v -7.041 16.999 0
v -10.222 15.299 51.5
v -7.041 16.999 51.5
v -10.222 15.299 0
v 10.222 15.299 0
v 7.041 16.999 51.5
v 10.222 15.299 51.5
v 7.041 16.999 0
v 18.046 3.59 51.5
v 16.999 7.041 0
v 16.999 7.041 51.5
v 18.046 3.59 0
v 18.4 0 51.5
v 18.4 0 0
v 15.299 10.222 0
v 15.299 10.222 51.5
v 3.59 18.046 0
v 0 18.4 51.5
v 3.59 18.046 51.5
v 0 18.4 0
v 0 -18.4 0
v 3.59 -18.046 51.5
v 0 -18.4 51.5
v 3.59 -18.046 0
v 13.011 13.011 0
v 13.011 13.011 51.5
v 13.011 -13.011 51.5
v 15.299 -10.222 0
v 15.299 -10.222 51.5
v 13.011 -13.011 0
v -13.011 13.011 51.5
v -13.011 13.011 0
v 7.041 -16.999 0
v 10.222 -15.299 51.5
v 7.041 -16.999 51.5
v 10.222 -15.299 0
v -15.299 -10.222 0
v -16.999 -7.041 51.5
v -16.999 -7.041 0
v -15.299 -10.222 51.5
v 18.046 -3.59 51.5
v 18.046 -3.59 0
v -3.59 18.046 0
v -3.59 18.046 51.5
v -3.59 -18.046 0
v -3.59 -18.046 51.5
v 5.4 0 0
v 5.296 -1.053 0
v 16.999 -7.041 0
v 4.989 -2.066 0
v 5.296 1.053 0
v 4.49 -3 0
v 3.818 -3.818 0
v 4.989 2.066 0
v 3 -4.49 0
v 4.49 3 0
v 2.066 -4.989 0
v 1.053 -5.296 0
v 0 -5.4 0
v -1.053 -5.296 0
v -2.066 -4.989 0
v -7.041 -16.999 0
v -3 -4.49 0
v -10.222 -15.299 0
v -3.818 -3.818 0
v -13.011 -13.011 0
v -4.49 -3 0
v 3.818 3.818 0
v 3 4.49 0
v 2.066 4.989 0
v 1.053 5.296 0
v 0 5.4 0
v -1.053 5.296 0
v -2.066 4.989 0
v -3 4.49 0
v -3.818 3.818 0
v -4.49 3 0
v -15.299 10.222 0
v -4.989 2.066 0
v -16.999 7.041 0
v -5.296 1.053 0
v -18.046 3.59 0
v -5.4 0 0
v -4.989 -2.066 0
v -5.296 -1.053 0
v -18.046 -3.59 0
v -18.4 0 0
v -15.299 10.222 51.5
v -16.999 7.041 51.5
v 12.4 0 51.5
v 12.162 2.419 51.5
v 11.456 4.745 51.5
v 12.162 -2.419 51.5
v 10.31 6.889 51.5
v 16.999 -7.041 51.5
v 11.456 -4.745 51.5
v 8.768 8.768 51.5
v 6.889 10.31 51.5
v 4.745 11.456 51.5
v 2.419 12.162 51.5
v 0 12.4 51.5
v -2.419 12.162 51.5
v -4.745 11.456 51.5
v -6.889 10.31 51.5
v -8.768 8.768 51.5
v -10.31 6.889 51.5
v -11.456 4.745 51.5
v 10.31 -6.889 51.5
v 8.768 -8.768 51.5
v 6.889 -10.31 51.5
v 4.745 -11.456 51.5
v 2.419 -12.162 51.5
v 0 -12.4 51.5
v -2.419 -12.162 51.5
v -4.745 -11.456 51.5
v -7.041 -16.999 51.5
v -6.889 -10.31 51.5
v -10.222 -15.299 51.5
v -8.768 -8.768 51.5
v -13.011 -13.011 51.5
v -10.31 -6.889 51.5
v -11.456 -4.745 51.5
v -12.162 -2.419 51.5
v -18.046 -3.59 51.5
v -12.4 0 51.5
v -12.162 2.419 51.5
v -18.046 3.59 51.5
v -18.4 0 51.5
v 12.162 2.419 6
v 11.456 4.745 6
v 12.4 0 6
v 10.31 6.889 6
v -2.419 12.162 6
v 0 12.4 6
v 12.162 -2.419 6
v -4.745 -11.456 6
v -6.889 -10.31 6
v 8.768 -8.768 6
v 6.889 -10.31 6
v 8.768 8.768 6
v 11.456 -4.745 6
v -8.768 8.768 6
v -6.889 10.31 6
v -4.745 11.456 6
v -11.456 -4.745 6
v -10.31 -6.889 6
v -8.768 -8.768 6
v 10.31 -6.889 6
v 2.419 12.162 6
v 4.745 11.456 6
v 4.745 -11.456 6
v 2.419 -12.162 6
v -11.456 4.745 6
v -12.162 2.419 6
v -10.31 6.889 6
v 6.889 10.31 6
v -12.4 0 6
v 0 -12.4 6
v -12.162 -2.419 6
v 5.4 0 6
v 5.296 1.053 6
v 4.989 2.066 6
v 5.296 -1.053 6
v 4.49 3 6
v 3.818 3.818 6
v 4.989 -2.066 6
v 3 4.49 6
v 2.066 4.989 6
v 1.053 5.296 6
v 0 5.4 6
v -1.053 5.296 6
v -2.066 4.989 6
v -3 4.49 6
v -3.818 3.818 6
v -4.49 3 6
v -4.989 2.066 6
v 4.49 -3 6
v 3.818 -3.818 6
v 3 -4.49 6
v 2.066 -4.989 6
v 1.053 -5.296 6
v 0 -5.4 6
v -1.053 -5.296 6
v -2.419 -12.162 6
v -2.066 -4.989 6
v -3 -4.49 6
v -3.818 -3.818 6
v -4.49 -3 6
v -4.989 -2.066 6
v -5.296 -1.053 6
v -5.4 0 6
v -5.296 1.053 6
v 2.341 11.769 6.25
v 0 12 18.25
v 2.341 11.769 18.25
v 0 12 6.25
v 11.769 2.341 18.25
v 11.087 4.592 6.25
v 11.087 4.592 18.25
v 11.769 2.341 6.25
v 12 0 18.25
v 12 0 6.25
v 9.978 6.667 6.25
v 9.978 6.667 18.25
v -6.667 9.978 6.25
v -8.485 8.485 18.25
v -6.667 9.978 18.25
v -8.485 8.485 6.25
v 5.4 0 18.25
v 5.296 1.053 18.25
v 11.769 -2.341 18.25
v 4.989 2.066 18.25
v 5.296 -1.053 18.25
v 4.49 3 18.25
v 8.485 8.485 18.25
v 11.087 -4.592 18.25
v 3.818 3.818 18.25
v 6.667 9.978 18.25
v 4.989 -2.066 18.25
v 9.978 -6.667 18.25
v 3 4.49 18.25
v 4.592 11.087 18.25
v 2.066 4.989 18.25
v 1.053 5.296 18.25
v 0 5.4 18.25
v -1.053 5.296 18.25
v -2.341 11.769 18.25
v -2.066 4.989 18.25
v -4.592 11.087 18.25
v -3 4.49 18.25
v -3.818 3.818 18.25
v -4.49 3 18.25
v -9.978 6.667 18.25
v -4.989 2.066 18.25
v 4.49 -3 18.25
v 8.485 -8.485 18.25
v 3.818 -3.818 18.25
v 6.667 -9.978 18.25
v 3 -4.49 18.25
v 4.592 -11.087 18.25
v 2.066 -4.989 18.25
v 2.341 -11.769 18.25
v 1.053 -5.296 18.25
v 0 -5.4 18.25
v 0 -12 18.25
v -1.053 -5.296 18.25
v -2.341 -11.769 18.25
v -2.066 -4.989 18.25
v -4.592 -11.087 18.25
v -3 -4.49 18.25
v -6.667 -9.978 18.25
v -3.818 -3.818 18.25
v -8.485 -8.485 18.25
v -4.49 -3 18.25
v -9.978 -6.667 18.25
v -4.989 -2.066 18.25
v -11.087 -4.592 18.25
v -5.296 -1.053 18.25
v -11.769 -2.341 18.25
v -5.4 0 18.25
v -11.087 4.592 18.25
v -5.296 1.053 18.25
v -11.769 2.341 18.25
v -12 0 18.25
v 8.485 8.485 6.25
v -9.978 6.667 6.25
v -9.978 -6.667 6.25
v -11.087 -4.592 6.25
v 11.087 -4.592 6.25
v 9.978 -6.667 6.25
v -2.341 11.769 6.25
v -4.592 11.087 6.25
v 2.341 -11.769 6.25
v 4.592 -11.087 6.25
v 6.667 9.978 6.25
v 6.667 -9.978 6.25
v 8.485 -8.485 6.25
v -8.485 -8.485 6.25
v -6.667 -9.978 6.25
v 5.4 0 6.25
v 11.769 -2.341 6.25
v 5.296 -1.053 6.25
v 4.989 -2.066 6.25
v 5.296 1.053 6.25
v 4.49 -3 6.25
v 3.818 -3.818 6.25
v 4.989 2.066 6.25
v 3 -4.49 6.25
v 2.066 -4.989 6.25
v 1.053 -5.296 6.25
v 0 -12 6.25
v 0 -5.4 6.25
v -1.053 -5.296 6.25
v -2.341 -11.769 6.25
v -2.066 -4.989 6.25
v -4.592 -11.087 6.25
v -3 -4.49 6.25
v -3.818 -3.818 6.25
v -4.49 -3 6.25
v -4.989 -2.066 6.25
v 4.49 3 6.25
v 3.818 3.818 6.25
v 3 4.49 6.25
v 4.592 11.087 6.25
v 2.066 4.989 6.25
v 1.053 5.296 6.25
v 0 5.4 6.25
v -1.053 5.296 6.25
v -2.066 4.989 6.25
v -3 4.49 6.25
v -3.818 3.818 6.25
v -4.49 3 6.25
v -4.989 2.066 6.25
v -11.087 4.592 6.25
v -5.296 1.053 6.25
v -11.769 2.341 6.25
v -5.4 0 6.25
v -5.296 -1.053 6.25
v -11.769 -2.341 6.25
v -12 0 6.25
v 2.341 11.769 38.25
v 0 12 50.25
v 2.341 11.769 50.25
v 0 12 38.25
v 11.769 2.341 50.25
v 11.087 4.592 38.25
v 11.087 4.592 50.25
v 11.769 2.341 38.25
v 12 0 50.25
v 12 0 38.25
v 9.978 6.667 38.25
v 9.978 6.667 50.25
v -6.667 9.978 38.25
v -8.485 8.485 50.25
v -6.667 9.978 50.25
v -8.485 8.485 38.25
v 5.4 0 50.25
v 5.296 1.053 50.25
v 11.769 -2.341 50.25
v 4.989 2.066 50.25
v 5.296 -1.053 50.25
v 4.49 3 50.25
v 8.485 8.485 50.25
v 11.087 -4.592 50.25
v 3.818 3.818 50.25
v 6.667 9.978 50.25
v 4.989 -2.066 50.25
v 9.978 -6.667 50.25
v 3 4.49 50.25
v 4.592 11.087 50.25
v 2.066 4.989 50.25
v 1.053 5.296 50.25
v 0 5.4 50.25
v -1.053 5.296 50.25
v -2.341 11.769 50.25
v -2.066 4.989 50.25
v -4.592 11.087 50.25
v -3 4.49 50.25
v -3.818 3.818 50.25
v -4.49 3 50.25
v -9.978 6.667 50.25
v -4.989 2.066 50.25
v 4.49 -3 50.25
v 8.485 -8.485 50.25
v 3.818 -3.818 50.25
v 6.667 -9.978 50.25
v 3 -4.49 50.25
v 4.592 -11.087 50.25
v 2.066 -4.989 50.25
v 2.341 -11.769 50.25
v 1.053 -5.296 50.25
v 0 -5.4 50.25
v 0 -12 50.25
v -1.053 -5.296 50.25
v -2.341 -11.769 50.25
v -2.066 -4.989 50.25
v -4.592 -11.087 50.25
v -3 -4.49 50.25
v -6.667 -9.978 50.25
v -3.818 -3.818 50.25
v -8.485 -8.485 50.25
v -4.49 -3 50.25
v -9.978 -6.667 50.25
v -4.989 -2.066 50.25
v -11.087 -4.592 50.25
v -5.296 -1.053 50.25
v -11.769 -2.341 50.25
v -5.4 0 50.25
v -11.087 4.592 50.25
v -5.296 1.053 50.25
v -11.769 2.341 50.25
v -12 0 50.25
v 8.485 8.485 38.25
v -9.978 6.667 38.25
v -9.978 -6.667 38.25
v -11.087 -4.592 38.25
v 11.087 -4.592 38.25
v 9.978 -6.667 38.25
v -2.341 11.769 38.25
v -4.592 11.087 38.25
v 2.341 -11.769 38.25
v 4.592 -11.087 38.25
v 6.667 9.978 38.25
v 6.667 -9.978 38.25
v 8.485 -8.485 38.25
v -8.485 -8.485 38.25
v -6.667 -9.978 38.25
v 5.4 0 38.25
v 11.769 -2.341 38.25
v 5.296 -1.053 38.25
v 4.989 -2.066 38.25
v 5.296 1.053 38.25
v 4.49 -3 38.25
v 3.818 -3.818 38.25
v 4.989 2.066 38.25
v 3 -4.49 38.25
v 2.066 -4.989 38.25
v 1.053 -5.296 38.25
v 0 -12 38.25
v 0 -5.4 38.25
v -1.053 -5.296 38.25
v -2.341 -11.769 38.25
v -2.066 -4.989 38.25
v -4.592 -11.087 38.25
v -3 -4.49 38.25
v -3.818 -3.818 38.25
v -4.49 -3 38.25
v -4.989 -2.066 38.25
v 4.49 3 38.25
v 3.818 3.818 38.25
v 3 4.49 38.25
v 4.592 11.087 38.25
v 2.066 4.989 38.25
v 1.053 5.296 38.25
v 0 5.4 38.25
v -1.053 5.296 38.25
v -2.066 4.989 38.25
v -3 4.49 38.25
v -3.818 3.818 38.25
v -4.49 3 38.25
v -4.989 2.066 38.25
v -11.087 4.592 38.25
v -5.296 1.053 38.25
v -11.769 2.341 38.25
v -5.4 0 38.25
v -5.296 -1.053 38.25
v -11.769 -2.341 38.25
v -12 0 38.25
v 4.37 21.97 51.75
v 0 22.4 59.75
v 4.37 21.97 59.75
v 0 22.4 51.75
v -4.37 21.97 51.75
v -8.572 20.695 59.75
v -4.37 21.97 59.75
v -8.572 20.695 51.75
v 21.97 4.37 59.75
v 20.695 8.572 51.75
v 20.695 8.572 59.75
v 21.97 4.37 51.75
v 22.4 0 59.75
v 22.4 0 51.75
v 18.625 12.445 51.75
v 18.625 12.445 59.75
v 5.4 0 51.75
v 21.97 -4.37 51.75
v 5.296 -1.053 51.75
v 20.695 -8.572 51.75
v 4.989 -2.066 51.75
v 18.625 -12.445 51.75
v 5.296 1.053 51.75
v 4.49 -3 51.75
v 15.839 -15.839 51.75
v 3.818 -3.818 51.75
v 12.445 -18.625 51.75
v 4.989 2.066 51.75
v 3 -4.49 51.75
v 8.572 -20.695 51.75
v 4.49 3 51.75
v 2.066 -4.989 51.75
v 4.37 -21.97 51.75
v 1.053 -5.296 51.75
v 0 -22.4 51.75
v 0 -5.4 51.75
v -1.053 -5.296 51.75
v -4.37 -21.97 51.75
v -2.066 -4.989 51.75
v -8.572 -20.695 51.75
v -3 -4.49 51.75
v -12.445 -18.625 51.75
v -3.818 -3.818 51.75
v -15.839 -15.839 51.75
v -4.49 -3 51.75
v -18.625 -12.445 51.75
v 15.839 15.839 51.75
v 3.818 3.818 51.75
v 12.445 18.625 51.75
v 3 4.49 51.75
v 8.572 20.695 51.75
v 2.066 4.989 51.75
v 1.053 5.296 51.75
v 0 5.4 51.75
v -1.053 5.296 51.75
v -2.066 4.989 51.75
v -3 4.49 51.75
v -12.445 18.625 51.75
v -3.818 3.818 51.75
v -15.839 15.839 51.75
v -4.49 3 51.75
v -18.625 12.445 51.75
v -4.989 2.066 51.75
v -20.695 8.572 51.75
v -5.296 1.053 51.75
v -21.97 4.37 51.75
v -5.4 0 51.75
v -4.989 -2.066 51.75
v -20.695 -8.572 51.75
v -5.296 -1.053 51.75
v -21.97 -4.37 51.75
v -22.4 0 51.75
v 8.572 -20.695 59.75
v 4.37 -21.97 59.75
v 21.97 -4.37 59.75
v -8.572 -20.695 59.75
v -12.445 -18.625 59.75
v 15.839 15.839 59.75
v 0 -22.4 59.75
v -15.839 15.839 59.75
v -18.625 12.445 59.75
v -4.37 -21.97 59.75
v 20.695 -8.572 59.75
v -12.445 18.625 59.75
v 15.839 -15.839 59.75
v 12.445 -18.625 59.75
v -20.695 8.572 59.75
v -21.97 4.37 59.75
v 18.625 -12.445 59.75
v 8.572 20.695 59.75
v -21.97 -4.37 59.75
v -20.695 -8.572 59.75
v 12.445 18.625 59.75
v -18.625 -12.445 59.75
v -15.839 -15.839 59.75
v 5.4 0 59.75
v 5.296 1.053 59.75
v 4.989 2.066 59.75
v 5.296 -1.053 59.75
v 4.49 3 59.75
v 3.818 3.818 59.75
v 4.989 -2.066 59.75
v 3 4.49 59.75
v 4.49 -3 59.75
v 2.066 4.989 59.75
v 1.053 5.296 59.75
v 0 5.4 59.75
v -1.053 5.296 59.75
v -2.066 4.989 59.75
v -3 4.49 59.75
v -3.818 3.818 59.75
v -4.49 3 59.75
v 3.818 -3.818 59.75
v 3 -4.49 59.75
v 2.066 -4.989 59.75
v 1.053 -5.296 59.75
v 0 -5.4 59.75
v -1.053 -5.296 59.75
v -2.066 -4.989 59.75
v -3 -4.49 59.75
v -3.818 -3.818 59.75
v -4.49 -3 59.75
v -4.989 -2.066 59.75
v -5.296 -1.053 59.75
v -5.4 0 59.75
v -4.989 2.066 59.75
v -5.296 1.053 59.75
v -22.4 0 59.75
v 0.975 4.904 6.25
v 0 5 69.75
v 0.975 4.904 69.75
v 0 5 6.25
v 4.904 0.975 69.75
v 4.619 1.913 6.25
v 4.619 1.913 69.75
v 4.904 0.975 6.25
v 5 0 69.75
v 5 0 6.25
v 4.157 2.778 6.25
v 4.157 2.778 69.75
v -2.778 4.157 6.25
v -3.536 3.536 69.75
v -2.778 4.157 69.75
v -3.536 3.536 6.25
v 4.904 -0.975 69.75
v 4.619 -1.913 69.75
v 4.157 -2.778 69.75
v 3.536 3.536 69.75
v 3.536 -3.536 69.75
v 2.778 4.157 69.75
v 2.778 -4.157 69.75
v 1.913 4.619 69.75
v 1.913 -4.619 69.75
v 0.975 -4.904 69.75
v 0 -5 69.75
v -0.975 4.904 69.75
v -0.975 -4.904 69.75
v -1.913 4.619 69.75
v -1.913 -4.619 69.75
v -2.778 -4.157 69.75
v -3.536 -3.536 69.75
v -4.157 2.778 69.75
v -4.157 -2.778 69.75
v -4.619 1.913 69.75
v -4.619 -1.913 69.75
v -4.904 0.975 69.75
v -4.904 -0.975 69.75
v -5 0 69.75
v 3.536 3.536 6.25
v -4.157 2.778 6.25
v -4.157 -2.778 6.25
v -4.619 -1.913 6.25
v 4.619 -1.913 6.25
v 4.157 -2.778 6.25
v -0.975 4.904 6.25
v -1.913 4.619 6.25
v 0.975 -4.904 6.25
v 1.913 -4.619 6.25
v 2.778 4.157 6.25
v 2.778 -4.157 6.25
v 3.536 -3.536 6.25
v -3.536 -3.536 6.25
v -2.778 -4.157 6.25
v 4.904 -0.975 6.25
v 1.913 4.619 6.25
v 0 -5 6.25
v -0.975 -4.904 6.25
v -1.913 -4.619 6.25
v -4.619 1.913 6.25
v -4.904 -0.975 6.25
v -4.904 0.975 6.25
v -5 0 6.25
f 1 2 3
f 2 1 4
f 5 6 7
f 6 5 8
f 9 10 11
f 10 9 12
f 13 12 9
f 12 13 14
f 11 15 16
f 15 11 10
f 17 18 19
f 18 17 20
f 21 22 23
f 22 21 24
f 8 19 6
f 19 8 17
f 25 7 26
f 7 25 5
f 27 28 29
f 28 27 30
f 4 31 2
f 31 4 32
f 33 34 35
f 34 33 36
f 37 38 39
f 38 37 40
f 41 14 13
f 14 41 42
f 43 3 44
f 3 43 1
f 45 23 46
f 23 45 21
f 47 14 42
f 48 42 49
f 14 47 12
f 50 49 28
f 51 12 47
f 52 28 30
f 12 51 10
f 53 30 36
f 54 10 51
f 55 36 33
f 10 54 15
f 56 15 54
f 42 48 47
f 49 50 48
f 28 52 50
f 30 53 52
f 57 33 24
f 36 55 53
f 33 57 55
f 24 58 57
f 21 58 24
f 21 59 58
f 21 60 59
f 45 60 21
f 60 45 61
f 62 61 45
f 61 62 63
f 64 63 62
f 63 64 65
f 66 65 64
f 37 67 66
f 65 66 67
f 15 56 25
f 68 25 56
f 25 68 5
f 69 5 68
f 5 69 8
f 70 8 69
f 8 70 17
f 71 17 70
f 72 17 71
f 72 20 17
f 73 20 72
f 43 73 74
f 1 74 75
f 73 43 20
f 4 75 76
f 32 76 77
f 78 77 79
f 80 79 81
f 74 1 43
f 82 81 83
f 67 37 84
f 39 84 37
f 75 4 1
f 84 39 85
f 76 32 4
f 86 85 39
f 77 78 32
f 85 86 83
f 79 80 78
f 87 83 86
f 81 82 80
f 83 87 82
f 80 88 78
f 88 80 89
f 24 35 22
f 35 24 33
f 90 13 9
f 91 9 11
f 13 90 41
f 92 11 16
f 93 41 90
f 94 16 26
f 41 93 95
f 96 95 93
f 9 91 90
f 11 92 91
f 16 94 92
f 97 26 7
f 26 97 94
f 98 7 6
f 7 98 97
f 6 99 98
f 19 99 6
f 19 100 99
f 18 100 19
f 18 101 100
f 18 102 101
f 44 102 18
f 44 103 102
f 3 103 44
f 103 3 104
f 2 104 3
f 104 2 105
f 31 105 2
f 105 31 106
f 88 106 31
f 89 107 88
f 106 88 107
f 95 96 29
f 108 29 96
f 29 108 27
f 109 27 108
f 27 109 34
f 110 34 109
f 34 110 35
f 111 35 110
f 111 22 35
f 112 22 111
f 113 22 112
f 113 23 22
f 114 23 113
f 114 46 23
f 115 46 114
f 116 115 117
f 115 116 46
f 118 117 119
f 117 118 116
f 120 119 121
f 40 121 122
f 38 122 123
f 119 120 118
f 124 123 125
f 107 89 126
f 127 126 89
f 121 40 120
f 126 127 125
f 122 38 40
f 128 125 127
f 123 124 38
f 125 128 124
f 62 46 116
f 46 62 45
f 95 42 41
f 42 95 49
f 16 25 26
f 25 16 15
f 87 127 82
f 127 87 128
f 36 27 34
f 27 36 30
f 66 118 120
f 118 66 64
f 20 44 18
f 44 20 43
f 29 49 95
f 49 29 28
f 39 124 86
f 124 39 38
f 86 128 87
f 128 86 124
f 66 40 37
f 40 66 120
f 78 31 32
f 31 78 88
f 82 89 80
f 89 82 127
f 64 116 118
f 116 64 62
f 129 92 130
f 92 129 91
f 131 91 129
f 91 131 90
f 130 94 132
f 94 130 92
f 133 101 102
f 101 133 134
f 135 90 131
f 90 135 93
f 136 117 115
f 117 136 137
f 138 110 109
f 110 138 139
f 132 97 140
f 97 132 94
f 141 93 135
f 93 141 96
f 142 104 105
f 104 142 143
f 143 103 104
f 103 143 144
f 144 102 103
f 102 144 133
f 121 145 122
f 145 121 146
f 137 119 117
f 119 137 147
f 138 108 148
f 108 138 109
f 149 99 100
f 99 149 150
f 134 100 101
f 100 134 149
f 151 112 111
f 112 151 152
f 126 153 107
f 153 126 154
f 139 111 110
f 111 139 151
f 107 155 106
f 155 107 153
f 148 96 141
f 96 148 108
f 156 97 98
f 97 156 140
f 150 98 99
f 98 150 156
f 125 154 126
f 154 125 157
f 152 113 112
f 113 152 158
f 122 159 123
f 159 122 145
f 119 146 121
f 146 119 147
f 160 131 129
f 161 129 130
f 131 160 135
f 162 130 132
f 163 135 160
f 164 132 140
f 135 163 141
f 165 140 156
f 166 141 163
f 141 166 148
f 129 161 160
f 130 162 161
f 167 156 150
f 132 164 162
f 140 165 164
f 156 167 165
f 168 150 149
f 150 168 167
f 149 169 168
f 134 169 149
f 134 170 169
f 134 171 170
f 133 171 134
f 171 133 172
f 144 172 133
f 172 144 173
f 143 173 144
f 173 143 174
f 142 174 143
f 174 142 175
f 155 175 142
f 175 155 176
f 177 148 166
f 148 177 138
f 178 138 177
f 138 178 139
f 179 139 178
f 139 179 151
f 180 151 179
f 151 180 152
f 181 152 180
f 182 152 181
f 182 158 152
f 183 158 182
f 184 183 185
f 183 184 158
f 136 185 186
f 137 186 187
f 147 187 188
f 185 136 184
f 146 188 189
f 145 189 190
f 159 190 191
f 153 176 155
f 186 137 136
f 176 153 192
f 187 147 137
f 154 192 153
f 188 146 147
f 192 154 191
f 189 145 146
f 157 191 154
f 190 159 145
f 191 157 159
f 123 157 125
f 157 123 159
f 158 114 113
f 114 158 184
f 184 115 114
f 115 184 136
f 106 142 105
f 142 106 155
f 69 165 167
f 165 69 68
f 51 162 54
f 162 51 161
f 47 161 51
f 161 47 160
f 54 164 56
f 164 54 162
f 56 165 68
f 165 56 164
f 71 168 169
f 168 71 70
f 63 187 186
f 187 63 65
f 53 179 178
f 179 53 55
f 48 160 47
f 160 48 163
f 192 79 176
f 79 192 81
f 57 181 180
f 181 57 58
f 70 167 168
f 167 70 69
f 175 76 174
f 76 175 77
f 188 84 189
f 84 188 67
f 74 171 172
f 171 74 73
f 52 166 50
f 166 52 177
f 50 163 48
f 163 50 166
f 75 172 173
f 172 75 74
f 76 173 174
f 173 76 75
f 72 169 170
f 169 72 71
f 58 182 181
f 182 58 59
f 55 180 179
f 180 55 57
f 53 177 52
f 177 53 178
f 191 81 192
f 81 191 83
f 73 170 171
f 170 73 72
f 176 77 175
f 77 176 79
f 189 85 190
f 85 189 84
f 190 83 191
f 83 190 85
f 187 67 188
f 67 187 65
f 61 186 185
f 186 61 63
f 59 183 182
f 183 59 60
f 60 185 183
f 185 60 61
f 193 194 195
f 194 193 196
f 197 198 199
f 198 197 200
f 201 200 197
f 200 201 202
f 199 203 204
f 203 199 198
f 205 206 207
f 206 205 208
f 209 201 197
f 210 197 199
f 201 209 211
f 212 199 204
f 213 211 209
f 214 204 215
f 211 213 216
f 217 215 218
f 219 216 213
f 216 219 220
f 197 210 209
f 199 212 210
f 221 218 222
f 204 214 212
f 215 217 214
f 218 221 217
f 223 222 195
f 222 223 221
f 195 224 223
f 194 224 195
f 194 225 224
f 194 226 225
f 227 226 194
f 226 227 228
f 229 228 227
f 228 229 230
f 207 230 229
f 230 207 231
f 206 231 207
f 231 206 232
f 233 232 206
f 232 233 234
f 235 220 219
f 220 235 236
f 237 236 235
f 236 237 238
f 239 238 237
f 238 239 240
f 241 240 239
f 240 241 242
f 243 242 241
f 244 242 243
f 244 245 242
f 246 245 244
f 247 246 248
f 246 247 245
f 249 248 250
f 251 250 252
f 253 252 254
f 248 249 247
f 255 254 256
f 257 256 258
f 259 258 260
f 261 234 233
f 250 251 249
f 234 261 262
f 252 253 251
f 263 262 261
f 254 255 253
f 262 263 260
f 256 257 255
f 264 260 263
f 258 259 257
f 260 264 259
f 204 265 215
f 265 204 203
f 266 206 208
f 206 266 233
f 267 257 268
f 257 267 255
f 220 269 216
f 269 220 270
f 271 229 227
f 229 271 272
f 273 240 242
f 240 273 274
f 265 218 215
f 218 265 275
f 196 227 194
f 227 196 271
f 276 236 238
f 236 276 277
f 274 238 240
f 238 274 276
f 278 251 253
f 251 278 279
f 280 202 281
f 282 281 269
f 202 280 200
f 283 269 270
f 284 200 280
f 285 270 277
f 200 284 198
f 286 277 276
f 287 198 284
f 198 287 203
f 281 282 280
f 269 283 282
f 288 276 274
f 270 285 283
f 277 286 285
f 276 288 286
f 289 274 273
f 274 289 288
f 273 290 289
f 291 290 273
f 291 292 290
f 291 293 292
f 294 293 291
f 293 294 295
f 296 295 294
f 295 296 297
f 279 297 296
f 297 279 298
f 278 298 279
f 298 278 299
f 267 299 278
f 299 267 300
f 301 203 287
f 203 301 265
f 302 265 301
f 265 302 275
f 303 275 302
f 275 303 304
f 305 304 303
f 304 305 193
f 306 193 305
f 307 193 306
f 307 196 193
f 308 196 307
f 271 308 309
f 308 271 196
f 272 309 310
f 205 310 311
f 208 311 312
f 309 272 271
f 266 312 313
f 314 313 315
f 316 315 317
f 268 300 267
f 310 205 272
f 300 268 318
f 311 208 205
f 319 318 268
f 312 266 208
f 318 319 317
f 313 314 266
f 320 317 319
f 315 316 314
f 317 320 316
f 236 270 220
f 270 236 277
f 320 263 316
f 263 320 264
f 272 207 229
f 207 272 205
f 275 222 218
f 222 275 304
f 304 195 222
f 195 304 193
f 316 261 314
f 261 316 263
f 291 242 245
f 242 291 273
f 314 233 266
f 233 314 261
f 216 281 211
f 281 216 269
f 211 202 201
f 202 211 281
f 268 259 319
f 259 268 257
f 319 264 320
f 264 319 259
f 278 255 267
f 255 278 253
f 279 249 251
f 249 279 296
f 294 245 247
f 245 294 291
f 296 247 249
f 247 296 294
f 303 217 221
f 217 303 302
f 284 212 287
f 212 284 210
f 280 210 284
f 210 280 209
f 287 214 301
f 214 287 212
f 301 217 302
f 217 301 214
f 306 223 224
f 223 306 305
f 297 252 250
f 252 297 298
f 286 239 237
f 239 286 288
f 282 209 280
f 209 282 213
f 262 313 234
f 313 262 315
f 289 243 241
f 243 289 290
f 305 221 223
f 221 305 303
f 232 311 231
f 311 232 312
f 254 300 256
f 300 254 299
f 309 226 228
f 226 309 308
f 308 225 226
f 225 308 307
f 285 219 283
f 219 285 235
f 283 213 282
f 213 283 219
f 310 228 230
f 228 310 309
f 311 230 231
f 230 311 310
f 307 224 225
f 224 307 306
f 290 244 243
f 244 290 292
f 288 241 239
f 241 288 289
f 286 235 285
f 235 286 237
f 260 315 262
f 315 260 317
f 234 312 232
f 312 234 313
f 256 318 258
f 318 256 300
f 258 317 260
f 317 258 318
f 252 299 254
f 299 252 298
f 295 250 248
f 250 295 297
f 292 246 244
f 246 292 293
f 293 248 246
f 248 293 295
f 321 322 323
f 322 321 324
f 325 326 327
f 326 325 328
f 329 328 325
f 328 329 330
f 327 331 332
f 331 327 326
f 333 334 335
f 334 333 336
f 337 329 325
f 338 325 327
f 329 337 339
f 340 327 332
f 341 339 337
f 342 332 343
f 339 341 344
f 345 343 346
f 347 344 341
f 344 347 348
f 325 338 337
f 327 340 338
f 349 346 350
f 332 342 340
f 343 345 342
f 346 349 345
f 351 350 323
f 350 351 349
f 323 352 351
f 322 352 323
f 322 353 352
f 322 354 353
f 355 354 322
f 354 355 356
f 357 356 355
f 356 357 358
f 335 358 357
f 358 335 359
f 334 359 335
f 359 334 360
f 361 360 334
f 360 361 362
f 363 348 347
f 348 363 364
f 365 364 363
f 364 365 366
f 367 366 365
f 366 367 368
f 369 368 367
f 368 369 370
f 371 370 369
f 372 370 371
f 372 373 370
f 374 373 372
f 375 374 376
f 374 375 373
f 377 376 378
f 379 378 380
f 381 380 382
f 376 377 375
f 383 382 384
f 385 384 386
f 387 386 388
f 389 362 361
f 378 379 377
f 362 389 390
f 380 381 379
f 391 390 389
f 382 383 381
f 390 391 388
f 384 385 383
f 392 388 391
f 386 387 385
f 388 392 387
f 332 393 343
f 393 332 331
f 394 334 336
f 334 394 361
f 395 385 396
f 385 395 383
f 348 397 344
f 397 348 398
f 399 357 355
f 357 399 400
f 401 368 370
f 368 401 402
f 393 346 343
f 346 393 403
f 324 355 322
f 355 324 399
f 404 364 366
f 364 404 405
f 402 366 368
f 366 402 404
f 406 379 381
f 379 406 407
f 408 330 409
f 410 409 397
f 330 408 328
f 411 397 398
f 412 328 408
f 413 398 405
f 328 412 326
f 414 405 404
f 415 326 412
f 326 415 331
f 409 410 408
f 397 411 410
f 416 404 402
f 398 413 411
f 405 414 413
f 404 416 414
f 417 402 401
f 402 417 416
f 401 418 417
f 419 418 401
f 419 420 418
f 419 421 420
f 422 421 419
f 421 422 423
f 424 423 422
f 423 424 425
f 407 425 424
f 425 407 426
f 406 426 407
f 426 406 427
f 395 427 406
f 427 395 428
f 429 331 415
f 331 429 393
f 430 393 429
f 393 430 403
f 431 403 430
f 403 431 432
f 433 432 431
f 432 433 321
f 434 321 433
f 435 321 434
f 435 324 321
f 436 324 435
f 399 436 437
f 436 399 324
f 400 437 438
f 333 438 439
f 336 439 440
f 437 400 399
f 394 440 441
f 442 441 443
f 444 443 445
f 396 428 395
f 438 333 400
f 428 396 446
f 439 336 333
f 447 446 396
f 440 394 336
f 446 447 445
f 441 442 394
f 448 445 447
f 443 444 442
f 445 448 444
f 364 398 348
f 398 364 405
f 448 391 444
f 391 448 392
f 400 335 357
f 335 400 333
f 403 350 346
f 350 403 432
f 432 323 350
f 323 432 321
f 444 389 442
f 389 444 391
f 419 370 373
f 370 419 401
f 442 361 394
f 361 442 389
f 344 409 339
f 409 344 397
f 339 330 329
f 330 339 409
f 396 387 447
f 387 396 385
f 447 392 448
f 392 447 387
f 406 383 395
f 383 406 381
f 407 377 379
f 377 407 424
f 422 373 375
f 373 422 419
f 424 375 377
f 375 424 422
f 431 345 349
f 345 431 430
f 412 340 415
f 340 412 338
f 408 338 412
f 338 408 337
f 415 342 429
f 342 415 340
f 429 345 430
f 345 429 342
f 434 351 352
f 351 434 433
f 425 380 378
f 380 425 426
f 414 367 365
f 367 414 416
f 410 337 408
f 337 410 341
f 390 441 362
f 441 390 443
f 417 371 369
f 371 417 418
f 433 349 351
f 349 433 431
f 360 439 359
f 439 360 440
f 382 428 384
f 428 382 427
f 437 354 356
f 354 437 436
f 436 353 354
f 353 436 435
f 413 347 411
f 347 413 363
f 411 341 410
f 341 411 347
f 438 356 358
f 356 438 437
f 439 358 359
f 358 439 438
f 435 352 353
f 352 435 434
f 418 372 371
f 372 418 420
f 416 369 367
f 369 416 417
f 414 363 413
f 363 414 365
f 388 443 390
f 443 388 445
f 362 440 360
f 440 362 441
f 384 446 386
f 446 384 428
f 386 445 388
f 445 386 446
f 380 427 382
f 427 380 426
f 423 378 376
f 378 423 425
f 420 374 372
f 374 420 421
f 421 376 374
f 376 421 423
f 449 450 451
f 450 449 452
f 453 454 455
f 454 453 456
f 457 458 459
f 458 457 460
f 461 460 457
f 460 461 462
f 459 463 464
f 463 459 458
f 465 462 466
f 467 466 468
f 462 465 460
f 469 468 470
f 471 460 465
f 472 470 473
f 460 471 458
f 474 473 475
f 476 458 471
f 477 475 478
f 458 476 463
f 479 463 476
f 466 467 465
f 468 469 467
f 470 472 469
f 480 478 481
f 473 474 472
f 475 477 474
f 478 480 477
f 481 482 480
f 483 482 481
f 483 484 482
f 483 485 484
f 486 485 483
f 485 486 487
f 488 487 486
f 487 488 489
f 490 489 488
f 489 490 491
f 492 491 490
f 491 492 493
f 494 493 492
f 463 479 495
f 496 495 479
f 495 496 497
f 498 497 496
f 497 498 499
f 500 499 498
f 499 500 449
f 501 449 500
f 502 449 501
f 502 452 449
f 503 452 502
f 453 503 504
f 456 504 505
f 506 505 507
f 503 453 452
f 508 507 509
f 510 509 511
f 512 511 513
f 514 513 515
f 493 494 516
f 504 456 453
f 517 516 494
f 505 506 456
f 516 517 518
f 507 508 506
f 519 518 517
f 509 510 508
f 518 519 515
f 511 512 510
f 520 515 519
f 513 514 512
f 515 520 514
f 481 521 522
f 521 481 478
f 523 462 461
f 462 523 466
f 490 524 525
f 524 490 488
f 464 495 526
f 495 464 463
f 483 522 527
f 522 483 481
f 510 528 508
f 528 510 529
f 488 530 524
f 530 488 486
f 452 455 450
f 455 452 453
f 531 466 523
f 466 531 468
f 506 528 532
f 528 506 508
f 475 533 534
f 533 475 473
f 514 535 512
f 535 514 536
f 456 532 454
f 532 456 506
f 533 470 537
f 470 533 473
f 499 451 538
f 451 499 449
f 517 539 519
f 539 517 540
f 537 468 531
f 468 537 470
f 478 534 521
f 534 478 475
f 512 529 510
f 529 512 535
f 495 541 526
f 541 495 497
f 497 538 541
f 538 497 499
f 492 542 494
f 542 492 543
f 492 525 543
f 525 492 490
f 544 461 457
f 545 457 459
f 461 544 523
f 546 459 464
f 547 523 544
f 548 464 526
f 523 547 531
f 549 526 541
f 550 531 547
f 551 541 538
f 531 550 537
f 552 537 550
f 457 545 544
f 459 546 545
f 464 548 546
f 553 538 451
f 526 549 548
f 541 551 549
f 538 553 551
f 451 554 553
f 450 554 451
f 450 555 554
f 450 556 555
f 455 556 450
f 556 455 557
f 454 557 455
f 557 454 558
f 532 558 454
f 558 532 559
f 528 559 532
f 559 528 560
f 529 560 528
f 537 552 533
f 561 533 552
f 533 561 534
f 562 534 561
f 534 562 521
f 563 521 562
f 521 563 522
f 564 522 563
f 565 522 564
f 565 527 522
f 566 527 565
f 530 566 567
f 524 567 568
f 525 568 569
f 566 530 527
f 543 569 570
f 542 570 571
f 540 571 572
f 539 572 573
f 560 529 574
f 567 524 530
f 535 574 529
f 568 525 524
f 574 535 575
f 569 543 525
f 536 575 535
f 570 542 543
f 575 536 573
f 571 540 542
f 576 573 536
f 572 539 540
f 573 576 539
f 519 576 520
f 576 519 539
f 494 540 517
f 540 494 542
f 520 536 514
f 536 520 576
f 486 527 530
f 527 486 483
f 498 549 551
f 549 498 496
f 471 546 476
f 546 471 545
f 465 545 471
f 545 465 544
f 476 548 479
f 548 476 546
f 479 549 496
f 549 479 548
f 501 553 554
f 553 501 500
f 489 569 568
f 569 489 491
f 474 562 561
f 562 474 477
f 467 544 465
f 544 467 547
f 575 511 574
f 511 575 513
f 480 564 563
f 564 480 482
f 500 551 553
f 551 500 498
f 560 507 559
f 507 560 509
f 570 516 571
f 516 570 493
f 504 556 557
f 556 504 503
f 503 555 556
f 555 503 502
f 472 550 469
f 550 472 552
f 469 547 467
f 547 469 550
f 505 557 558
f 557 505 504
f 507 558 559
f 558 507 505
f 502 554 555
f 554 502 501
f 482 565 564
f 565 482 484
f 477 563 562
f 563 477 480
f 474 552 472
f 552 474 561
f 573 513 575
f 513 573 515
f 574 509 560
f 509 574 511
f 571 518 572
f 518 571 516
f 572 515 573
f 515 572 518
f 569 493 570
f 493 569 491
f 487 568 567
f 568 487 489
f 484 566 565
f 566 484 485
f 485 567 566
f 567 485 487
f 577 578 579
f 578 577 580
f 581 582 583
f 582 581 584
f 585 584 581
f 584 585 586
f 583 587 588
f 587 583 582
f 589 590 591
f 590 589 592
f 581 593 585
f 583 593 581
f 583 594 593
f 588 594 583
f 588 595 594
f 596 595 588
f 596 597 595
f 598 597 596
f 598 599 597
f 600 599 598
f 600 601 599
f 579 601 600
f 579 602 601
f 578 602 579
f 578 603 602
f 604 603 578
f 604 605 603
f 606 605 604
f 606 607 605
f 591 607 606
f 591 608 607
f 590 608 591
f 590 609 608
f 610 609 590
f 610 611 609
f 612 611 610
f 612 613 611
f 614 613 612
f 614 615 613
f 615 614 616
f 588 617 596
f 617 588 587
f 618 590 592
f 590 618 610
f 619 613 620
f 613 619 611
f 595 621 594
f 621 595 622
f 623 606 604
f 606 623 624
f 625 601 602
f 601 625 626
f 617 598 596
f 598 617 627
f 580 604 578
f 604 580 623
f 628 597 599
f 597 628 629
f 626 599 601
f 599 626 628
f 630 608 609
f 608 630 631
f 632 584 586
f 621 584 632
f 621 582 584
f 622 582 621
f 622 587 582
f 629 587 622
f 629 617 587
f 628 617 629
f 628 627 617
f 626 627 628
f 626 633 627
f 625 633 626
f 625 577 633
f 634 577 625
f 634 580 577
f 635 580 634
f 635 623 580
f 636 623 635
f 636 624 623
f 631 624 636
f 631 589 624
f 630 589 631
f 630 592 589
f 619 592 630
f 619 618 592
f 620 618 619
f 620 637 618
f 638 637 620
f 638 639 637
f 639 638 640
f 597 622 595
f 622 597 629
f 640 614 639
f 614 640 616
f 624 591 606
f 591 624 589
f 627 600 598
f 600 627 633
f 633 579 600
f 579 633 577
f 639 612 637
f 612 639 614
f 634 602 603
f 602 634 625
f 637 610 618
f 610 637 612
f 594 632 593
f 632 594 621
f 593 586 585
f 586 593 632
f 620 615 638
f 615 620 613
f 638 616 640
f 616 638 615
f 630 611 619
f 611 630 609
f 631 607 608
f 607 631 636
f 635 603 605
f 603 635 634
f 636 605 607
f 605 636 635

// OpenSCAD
$fn = 32;

// ------------------------------------------------------------------------
// Shaft station: cup d36.8 x 51.5 mm, shaft d10
// Every part is its own module, assembly() places every instance.
// ------------------------------------------------------------------------

// --- part 1 ---
module housing_cup() {
  difference() {
    cylinder(h = 51.5, d = 36.8);
    translate([0, 0, 6]) cylinder(h = 46.5, d = 24.8);
    translate([0, 0, -1]) cylinder(h = 8, d = 10.8);
  }
}

// --- part 2 ---
module bearing_lower() {
  difference() {
      translate([0, 0, 0]) cylinder(h = 12, d = 24);
      translate([0, 0, -1]) cylinder(h = 14, d = 10.8);
    }
}

// --- part 3 ---
module bearing_upper() {
  difference() {
      translate([0, 0, 0]) cylinder(h = 12, d = 24);
      translate([0, 0, -1]) cylinder(h = 14, d = 10.8);
    }
}

// --- part 4 ---
module station_shaft() {
  translate([0, 0, -31.75]) cylinder(h = 63.5, d = 10);
}

// --- part 5 ---
module station_cover() {
  difference() {
    cylinder(h = 8, d = 44.8);
    translate([0, 0, -1]) cylinder(h = 10, d = 10.8);
  }
}

// --- assembly ---
module assembly() {
  color([0.80, 0.24, 0.20]) translate([0, 0, 0]) rotate([0, 0, 0]) housing_cup();
  color([0.20, 0.45, 0.75]) translate([0, 0, 6.25]) rotate([0, 0, 0]) bearing_lower();
  color([0.25, 0.62, 0.32]) translate([0, 0, 38.25]) rotate([0, 0, 0]) bearing_upper();
  color([0.92, 0.70, 0.18]) translate([0, 0, 38]) rotate([0, 0, 0]) station_shaft();
  color([0.58, 0.35, 0.70]) translate([0, 0, 51.75]) rotate([0, 0, 0]) station_cover();
}

assembly();
